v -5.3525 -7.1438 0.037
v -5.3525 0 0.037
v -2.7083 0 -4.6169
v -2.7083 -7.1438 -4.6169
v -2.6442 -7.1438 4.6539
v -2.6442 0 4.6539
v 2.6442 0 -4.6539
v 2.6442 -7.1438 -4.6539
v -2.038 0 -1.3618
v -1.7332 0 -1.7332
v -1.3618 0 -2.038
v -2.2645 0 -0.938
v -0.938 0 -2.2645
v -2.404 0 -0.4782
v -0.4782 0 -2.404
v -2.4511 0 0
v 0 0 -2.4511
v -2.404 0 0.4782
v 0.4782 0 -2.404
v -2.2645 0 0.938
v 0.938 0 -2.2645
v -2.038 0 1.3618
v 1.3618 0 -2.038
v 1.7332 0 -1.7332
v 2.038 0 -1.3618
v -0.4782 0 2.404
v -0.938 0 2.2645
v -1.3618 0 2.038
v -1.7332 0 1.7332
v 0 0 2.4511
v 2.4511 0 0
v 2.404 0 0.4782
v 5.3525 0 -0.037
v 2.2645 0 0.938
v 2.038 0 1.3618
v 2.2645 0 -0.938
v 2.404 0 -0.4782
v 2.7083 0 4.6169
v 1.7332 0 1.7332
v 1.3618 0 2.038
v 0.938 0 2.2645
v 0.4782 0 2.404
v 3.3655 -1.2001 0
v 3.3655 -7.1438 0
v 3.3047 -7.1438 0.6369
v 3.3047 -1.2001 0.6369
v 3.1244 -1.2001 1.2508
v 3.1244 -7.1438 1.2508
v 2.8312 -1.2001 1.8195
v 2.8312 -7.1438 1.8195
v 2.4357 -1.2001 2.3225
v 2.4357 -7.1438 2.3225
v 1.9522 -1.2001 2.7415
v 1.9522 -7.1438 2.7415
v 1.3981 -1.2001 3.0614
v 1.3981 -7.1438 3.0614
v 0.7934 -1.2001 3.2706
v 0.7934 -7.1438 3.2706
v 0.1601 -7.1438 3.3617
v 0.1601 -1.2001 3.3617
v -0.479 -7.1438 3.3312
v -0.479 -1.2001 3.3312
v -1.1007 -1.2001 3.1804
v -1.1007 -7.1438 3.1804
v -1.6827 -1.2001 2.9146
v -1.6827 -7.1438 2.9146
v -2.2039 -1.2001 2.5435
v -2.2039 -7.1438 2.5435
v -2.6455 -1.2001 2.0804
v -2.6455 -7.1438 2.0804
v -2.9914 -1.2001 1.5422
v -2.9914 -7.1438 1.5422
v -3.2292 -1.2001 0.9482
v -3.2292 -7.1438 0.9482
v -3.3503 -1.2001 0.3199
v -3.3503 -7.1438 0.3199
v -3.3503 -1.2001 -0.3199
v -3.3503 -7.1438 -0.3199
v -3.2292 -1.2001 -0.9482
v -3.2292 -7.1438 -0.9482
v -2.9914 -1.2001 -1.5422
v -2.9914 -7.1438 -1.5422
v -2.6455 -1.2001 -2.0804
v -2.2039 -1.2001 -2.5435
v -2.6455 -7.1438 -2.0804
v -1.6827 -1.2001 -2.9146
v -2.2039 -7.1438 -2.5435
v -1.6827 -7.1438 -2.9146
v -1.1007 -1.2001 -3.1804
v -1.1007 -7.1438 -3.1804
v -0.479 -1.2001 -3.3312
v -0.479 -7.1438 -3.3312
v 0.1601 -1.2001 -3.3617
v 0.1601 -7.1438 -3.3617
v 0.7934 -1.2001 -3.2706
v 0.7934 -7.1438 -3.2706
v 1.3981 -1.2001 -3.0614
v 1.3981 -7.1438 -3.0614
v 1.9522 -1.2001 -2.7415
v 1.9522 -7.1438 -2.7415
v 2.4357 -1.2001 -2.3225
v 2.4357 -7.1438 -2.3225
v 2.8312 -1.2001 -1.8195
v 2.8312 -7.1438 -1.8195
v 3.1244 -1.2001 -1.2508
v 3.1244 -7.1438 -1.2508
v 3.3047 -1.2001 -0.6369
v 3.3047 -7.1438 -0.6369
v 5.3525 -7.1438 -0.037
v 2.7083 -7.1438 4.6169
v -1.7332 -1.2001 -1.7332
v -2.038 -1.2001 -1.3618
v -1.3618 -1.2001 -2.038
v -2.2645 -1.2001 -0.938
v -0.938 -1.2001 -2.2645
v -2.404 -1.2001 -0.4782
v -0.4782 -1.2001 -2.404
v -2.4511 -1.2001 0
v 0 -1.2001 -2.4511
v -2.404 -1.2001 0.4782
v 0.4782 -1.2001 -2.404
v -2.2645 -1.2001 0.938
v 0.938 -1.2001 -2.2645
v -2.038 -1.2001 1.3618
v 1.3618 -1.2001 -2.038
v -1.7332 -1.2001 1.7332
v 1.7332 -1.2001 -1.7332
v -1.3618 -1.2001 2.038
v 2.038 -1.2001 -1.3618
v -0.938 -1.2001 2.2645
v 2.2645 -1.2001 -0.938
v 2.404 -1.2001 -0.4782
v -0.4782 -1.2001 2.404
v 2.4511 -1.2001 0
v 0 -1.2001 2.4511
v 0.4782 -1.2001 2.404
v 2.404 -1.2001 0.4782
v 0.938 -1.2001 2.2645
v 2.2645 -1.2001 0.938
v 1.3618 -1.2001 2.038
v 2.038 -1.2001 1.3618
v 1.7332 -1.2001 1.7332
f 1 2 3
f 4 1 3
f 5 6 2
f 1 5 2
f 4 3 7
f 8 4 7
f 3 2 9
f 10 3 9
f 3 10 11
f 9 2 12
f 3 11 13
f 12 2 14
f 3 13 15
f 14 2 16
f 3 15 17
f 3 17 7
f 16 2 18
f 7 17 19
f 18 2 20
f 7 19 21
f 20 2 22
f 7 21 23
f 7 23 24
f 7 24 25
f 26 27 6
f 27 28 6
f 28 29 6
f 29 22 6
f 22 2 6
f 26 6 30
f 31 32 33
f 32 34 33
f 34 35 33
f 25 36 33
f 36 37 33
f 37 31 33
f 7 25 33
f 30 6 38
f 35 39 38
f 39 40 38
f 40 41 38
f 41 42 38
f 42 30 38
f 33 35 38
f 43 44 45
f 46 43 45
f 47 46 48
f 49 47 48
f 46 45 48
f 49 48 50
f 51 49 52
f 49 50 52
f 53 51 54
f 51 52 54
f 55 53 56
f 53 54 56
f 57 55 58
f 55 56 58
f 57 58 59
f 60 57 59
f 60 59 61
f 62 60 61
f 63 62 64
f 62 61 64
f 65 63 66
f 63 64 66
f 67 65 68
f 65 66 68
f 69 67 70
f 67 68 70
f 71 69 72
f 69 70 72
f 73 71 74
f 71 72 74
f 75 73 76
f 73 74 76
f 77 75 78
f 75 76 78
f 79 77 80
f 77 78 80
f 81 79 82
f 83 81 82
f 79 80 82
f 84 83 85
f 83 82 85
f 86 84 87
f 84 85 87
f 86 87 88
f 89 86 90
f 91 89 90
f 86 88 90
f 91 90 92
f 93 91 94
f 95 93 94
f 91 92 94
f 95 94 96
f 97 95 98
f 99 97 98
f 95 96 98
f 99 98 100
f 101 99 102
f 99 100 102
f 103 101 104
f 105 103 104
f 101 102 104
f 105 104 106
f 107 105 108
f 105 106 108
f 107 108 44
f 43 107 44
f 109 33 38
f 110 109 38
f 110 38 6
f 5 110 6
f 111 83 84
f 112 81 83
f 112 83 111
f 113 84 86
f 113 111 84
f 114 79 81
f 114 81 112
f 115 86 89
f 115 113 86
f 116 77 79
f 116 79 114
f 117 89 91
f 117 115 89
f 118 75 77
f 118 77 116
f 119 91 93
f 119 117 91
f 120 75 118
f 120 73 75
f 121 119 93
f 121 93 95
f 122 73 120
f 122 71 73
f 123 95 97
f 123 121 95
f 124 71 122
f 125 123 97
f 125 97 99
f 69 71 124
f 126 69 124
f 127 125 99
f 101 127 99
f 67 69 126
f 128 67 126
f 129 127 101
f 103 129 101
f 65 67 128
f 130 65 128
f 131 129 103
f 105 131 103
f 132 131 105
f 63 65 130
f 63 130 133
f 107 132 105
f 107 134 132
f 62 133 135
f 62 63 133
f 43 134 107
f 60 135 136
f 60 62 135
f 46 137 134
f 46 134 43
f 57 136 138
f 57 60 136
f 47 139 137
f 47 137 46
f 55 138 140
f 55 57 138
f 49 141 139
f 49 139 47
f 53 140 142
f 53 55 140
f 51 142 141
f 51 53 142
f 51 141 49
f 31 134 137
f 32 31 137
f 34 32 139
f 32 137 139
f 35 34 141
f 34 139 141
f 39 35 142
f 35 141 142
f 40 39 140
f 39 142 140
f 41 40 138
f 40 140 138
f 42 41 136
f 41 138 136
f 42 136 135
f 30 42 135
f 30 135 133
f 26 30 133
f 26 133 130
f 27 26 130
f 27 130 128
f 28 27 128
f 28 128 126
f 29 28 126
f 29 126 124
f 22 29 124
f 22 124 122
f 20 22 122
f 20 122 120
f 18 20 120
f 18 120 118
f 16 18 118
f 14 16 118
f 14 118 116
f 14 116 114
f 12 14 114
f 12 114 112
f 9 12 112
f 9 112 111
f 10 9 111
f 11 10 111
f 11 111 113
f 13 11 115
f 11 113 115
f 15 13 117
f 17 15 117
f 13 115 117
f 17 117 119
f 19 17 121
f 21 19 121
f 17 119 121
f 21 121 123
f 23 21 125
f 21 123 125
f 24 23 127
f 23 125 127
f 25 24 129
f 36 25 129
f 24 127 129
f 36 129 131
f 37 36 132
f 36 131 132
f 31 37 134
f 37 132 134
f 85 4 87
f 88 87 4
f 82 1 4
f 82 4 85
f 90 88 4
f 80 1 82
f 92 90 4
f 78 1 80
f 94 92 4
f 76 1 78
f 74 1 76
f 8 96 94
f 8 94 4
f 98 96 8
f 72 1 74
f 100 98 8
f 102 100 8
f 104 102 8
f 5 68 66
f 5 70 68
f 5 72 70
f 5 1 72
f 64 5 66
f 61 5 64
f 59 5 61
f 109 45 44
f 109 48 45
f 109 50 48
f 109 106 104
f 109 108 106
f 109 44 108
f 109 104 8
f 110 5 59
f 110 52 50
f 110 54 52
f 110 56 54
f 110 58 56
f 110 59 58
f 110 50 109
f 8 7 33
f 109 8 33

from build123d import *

# Parameters (mm, degrees)
F1_DEPTH = 7.14375
F2_R     = 2.4511
F3_DEPTH = 7.14475
F4_R     = 3.3655
F5_DEPTH = 5.9436


with BuildPart() as f1:
    # F0 (on Front) → F1 (new body)
    with BuildSketch(Plane.XZ):
        Polygon((-2.644188, 4.653896), (-5.352486, 0.037014), (-2.708298, -4.616882), (2.644188, -4.653896), (5.352486, -0.037014), (2.708298, 4.616882), align=None)
    extrude(amount=F1_DEPTH)

    # F2 (on face) → F3 (cut, through all)
    with BuildSketch(Plane.XZ.offset(7.14375)):
        Circle(F2_R)
    extrude(amount=-F3_DEPTH, mode=Mode.SUBTRACT)

    # F4 (on face) → F5 (cut)
    with BuildSketch(Plane.XZ.offset(7.14375)):
        Circle(F4_R)
    extrude(amount=-F5_DEPTH, mode=Mode.SUBTRACT)


solid = f1.part
